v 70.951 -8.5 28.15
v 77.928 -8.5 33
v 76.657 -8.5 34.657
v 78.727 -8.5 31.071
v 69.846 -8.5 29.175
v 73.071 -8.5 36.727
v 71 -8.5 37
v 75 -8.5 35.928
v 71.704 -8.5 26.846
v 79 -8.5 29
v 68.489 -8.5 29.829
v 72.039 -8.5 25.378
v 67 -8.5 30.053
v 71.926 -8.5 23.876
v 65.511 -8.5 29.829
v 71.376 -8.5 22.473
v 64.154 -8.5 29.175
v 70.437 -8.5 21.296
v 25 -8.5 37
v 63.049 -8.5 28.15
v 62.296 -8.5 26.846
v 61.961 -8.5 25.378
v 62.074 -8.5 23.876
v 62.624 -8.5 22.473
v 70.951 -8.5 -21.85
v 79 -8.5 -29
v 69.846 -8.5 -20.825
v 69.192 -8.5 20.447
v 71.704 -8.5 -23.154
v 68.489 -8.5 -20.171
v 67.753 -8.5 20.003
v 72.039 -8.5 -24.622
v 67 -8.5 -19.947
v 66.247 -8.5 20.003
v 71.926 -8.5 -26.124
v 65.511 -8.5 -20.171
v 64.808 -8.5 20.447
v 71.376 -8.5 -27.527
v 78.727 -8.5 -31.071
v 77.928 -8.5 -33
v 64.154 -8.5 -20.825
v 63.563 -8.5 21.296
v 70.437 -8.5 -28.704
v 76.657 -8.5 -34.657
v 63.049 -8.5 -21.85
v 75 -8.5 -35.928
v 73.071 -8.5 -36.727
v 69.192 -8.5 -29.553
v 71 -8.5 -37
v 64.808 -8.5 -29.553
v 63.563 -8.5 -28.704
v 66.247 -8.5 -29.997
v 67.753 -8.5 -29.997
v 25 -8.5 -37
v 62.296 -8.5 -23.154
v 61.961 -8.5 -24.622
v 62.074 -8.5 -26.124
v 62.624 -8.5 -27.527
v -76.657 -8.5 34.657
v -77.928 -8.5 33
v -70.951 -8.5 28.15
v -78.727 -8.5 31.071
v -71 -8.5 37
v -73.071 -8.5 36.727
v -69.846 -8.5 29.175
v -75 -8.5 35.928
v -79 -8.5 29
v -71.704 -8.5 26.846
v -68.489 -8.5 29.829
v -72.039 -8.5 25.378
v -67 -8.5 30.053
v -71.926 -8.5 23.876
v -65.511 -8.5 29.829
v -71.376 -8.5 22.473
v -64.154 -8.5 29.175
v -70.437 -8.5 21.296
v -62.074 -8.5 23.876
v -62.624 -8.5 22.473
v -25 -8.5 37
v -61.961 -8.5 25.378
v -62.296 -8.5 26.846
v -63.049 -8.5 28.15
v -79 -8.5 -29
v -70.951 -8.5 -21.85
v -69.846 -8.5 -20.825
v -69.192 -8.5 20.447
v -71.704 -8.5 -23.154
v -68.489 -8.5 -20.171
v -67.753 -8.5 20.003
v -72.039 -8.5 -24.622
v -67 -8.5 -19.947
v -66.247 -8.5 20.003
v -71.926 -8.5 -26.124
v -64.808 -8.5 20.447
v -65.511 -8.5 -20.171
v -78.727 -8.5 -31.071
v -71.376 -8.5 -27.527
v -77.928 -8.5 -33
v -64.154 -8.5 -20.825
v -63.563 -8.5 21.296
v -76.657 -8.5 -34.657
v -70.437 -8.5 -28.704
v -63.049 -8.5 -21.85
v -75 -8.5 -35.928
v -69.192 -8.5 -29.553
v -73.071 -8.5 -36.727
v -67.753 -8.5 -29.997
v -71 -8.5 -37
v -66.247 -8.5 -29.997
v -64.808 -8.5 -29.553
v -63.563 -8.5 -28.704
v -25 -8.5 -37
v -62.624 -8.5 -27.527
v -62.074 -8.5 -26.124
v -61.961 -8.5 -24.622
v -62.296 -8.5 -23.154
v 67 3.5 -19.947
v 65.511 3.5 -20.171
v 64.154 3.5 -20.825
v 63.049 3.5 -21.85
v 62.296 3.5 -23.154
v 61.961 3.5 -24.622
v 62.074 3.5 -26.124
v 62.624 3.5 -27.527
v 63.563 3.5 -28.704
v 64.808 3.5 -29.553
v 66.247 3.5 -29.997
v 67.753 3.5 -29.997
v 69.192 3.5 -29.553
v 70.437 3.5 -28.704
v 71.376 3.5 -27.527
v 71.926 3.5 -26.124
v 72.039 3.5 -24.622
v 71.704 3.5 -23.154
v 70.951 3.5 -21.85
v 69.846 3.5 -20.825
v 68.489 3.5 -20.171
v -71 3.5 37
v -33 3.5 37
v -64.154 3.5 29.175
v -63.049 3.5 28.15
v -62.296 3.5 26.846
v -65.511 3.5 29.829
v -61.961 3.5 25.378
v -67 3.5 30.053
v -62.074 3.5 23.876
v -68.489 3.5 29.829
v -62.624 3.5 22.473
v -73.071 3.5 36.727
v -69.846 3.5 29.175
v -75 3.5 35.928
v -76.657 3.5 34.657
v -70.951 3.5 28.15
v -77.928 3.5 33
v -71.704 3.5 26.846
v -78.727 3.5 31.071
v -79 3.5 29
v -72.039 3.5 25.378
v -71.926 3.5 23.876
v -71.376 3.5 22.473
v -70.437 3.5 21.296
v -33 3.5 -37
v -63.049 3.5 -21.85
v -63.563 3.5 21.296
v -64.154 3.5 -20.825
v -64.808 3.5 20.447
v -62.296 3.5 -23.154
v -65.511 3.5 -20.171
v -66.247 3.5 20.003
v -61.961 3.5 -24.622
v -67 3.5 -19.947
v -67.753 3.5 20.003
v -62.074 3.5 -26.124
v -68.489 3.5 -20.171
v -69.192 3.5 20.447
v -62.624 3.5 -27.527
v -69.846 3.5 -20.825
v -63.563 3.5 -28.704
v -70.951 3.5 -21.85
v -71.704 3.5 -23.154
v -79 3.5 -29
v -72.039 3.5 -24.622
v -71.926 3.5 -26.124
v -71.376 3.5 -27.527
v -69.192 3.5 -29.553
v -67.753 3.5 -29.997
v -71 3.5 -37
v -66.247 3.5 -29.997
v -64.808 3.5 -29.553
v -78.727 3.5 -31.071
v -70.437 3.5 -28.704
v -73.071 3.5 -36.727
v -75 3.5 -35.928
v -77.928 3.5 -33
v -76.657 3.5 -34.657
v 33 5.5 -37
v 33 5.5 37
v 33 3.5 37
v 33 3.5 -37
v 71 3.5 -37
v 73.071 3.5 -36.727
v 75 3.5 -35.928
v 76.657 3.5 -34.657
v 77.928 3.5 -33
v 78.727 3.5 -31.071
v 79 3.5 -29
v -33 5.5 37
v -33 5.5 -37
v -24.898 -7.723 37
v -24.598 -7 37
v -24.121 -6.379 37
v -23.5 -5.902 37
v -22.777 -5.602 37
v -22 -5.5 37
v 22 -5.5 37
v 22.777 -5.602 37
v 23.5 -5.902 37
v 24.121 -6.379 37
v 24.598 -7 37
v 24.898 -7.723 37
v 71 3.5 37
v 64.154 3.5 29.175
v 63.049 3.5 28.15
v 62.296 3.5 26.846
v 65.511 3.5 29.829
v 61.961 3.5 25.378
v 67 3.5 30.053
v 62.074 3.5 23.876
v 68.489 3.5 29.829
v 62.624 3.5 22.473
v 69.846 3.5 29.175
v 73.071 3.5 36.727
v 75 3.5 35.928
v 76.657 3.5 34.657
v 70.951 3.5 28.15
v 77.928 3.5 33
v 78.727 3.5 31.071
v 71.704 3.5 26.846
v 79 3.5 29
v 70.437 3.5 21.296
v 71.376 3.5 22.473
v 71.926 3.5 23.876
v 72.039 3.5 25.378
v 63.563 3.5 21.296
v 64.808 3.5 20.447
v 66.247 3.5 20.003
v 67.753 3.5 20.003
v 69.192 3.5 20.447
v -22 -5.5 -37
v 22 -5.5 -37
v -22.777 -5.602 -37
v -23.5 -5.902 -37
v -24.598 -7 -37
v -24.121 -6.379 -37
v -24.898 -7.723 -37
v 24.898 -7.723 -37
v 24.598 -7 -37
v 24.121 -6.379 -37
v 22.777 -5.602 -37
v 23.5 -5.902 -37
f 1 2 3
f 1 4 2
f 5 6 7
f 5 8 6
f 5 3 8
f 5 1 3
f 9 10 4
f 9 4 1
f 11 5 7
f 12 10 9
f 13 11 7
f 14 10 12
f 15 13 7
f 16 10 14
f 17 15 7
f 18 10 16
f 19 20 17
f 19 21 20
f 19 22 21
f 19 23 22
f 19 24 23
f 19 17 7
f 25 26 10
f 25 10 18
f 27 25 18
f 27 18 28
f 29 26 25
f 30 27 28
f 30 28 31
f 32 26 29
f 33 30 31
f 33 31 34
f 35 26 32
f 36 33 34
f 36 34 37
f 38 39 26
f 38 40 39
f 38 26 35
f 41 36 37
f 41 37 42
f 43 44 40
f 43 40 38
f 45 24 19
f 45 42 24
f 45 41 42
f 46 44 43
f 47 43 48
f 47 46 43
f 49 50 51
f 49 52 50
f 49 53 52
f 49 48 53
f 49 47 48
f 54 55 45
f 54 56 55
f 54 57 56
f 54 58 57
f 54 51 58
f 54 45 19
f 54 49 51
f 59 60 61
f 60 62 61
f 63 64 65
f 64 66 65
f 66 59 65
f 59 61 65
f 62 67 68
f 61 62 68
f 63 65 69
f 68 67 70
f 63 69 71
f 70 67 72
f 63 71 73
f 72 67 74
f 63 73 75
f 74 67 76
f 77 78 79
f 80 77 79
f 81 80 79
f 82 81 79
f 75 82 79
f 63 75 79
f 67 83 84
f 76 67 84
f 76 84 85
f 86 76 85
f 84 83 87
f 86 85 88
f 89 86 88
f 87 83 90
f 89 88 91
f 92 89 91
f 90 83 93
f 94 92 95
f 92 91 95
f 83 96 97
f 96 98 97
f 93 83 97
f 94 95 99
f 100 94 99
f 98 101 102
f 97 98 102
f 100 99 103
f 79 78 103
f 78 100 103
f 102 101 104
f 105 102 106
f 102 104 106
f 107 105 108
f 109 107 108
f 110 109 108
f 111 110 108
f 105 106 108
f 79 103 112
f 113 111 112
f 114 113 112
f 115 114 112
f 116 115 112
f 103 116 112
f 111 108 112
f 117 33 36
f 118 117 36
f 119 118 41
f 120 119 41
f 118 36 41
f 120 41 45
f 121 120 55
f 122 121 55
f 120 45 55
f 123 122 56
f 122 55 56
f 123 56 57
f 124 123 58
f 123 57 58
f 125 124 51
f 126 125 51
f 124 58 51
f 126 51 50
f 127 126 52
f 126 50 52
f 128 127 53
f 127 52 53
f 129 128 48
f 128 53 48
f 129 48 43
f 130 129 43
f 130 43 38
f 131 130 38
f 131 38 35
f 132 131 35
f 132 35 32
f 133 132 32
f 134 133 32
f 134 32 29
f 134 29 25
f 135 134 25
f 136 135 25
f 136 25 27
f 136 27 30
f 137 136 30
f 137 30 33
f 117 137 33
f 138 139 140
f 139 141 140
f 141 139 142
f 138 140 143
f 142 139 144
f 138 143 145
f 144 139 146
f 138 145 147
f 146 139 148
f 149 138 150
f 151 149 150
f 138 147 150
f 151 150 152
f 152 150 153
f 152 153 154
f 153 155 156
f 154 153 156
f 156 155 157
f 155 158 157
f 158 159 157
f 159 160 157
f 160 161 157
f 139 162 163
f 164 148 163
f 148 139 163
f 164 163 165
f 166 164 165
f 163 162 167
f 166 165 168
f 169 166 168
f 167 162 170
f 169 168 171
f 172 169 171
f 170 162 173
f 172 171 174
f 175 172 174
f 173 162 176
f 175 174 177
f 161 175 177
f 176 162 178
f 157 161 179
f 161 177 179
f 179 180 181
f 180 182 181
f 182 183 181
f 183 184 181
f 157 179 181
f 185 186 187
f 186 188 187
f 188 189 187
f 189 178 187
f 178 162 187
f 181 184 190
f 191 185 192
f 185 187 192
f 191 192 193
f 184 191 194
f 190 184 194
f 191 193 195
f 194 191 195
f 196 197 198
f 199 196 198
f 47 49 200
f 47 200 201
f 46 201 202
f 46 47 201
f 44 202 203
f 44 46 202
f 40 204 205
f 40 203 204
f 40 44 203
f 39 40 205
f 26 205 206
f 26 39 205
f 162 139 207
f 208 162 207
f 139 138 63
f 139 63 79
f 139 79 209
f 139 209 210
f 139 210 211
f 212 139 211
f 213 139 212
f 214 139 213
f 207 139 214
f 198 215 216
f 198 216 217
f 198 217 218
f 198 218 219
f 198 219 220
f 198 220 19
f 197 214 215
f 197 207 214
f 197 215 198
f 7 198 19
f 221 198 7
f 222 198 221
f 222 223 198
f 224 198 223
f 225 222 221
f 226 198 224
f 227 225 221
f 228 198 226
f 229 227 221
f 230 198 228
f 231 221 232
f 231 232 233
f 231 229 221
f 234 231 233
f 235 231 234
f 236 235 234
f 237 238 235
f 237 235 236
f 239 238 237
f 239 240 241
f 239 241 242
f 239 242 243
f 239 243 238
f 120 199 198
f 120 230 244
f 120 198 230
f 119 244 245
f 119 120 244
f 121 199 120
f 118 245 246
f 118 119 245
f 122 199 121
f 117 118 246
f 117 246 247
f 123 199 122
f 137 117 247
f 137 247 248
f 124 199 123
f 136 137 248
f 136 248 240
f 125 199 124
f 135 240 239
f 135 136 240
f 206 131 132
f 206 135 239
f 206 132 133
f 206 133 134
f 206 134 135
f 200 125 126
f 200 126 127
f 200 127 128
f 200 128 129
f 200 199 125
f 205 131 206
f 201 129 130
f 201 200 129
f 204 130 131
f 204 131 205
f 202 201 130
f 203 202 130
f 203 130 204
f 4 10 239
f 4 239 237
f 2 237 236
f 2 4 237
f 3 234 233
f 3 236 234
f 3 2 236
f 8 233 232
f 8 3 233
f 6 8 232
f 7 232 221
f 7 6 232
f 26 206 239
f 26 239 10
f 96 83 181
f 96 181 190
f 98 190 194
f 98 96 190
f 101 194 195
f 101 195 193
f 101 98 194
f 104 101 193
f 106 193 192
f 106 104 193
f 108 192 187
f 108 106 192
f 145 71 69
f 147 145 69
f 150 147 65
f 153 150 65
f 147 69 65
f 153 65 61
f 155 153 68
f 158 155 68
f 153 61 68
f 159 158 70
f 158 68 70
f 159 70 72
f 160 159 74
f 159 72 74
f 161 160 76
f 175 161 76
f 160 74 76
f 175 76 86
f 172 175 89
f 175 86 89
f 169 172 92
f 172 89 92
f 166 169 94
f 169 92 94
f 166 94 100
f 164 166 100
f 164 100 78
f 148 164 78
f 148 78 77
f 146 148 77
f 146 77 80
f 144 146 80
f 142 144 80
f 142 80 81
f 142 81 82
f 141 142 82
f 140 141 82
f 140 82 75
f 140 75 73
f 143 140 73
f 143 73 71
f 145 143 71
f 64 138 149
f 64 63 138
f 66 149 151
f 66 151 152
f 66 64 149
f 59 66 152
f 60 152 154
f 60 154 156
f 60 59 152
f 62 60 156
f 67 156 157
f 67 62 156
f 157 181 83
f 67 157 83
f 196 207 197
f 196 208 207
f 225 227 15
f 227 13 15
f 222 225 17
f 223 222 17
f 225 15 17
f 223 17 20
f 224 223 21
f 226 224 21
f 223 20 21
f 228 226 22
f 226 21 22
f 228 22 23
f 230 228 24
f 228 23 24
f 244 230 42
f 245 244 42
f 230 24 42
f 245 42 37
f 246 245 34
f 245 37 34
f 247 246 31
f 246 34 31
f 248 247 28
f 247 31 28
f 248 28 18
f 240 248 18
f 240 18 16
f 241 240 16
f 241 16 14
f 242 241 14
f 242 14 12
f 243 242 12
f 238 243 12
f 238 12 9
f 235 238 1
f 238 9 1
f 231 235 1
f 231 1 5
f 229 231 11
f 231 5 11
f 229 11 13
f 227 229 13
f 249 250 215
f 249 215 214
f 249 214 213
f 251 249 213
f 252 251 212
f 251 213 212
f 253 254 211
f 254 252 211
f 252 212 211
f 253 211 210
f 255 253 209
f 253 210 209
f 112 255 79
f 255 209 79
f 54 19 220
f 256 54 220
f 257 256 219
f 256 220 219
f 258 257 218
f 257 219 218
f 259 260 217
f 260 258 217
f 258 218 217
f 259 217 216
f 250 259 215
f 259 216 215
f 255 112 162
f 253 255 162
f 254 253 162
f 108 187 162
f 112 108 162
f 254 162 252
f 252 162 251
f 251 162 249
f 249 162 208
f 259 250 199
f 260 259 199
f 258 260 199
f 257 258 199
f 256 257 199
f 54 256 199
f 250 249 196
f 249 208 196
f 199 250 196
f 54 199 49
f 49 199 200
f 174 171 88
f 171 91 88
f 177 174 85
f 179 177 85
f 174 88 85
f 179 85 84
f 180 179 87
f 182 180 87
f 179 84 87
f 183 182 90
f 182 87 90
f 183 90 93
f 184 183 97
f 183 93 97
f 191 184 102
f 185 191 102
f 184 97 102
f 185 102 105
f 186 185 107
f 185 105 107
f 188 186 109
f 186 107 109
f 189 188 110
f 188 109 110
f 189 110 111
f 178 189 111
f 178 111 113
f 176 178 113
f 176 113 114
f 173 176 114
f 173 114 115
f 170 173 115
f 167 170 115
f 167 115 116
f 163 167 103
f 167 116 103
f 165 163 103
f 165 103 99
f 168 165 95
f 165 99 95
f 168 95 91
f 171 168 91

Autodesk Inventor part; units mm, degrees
ref_plane "YZ Plane" through (0, 0, 0) normal (1, 0, 0) x (0, 1, 0)
ref_plane "XZ Plane" through (0, 0, 0) normal (0, 1, 0) x (-1, 0, 0)
ref_plane "XY Plane" through (0, 0, 0) normal (0, 0, 1) x (1, 0, 0)
sketch "Sketch1" plane through (0, 0, 0) normal (0, 0, 1) x (1, 0, 0)
  line L0 (33, -5.5) -> (-33, -5.5)
  line L1 (-33, -5.5) -> (-33, 5.5)
  line L2 (-33, 5.5) -> (33, 5.5)
  line L3 (33, 5.5) -> (33, -5.5)
  line L4 (33, -5.5) -> (-33, 5.5) construction
  line L5 (-33, -5.5) -> (33, 5.5) construction
  line L6 (-25, 3.5) -> (-79, 3.5)
  line L7 (-79, 3.5) -> (-79, -8.5)
  line L8 (-79, -8.5) -> (-25, -8.5)
  line L9 (-25, -8.5) -> (-25, 3.5)
  line L10 (0, 0) -> (0, 20.8366) construction
  line L11 (25, 3.5) -> (79, 3.5)
  line L12 (79, 3.5) -> (79, -8.5)
  line L13 (79, -8.5) -> (25, -8.5)
  line L14 (25, -8.5) -> (25, 3.5)
  point P0 (-25, -5.5)
  point P1 (25, -5.5)
  point P2 (33, 3.5)
  point P3 (-33, 3.5)
  dimension "d0" = 158
  dimension "d3" = 50
  dimension "d4" = 66
  dimension "d5" = 3
  dimension "d6" = 12
  dimension "d7" = 14
extrude "Extrusion1" add sketch "Sketch1" along normal mid plane 74
fillet "Fillet1" radius 3 2 edges at (25, -5.5, 0) (-25, -5.5, 0)
sketch "Sketch3" plane through (-79, 3.5, 37) normal (0, 1, 0) x (1, 0, 0)
  line L0 (46, 0) -> (0, 0) projected
  line L1 (0, 74) -> (0, 0) projected
  point P0 (79, 37)
  point P1 (12, 12)
  dimension "d11" = 12
  dimension "d12" = 12
hole "Hole1" at (-67, 3.5, 25) direction (0, -1, 0) diameter 10.106 end through all thread size "M12x1.75" class "6H" standard "ISO Metric profile"
pattern_linear "Rectangular Pattern1" count 2 spacing 50 along (0, 0, -1) count 2 spacing 134 along (1, 0, 0) of "Hole1"
fillet "Fillet2" radius 8 4 edges at (-79, -2.5, 37) (-79, -2.5, -37) (79, -2.5, -37) (79, -2.5, 37)
properties part number "01-base" material "Iron, Gray"
